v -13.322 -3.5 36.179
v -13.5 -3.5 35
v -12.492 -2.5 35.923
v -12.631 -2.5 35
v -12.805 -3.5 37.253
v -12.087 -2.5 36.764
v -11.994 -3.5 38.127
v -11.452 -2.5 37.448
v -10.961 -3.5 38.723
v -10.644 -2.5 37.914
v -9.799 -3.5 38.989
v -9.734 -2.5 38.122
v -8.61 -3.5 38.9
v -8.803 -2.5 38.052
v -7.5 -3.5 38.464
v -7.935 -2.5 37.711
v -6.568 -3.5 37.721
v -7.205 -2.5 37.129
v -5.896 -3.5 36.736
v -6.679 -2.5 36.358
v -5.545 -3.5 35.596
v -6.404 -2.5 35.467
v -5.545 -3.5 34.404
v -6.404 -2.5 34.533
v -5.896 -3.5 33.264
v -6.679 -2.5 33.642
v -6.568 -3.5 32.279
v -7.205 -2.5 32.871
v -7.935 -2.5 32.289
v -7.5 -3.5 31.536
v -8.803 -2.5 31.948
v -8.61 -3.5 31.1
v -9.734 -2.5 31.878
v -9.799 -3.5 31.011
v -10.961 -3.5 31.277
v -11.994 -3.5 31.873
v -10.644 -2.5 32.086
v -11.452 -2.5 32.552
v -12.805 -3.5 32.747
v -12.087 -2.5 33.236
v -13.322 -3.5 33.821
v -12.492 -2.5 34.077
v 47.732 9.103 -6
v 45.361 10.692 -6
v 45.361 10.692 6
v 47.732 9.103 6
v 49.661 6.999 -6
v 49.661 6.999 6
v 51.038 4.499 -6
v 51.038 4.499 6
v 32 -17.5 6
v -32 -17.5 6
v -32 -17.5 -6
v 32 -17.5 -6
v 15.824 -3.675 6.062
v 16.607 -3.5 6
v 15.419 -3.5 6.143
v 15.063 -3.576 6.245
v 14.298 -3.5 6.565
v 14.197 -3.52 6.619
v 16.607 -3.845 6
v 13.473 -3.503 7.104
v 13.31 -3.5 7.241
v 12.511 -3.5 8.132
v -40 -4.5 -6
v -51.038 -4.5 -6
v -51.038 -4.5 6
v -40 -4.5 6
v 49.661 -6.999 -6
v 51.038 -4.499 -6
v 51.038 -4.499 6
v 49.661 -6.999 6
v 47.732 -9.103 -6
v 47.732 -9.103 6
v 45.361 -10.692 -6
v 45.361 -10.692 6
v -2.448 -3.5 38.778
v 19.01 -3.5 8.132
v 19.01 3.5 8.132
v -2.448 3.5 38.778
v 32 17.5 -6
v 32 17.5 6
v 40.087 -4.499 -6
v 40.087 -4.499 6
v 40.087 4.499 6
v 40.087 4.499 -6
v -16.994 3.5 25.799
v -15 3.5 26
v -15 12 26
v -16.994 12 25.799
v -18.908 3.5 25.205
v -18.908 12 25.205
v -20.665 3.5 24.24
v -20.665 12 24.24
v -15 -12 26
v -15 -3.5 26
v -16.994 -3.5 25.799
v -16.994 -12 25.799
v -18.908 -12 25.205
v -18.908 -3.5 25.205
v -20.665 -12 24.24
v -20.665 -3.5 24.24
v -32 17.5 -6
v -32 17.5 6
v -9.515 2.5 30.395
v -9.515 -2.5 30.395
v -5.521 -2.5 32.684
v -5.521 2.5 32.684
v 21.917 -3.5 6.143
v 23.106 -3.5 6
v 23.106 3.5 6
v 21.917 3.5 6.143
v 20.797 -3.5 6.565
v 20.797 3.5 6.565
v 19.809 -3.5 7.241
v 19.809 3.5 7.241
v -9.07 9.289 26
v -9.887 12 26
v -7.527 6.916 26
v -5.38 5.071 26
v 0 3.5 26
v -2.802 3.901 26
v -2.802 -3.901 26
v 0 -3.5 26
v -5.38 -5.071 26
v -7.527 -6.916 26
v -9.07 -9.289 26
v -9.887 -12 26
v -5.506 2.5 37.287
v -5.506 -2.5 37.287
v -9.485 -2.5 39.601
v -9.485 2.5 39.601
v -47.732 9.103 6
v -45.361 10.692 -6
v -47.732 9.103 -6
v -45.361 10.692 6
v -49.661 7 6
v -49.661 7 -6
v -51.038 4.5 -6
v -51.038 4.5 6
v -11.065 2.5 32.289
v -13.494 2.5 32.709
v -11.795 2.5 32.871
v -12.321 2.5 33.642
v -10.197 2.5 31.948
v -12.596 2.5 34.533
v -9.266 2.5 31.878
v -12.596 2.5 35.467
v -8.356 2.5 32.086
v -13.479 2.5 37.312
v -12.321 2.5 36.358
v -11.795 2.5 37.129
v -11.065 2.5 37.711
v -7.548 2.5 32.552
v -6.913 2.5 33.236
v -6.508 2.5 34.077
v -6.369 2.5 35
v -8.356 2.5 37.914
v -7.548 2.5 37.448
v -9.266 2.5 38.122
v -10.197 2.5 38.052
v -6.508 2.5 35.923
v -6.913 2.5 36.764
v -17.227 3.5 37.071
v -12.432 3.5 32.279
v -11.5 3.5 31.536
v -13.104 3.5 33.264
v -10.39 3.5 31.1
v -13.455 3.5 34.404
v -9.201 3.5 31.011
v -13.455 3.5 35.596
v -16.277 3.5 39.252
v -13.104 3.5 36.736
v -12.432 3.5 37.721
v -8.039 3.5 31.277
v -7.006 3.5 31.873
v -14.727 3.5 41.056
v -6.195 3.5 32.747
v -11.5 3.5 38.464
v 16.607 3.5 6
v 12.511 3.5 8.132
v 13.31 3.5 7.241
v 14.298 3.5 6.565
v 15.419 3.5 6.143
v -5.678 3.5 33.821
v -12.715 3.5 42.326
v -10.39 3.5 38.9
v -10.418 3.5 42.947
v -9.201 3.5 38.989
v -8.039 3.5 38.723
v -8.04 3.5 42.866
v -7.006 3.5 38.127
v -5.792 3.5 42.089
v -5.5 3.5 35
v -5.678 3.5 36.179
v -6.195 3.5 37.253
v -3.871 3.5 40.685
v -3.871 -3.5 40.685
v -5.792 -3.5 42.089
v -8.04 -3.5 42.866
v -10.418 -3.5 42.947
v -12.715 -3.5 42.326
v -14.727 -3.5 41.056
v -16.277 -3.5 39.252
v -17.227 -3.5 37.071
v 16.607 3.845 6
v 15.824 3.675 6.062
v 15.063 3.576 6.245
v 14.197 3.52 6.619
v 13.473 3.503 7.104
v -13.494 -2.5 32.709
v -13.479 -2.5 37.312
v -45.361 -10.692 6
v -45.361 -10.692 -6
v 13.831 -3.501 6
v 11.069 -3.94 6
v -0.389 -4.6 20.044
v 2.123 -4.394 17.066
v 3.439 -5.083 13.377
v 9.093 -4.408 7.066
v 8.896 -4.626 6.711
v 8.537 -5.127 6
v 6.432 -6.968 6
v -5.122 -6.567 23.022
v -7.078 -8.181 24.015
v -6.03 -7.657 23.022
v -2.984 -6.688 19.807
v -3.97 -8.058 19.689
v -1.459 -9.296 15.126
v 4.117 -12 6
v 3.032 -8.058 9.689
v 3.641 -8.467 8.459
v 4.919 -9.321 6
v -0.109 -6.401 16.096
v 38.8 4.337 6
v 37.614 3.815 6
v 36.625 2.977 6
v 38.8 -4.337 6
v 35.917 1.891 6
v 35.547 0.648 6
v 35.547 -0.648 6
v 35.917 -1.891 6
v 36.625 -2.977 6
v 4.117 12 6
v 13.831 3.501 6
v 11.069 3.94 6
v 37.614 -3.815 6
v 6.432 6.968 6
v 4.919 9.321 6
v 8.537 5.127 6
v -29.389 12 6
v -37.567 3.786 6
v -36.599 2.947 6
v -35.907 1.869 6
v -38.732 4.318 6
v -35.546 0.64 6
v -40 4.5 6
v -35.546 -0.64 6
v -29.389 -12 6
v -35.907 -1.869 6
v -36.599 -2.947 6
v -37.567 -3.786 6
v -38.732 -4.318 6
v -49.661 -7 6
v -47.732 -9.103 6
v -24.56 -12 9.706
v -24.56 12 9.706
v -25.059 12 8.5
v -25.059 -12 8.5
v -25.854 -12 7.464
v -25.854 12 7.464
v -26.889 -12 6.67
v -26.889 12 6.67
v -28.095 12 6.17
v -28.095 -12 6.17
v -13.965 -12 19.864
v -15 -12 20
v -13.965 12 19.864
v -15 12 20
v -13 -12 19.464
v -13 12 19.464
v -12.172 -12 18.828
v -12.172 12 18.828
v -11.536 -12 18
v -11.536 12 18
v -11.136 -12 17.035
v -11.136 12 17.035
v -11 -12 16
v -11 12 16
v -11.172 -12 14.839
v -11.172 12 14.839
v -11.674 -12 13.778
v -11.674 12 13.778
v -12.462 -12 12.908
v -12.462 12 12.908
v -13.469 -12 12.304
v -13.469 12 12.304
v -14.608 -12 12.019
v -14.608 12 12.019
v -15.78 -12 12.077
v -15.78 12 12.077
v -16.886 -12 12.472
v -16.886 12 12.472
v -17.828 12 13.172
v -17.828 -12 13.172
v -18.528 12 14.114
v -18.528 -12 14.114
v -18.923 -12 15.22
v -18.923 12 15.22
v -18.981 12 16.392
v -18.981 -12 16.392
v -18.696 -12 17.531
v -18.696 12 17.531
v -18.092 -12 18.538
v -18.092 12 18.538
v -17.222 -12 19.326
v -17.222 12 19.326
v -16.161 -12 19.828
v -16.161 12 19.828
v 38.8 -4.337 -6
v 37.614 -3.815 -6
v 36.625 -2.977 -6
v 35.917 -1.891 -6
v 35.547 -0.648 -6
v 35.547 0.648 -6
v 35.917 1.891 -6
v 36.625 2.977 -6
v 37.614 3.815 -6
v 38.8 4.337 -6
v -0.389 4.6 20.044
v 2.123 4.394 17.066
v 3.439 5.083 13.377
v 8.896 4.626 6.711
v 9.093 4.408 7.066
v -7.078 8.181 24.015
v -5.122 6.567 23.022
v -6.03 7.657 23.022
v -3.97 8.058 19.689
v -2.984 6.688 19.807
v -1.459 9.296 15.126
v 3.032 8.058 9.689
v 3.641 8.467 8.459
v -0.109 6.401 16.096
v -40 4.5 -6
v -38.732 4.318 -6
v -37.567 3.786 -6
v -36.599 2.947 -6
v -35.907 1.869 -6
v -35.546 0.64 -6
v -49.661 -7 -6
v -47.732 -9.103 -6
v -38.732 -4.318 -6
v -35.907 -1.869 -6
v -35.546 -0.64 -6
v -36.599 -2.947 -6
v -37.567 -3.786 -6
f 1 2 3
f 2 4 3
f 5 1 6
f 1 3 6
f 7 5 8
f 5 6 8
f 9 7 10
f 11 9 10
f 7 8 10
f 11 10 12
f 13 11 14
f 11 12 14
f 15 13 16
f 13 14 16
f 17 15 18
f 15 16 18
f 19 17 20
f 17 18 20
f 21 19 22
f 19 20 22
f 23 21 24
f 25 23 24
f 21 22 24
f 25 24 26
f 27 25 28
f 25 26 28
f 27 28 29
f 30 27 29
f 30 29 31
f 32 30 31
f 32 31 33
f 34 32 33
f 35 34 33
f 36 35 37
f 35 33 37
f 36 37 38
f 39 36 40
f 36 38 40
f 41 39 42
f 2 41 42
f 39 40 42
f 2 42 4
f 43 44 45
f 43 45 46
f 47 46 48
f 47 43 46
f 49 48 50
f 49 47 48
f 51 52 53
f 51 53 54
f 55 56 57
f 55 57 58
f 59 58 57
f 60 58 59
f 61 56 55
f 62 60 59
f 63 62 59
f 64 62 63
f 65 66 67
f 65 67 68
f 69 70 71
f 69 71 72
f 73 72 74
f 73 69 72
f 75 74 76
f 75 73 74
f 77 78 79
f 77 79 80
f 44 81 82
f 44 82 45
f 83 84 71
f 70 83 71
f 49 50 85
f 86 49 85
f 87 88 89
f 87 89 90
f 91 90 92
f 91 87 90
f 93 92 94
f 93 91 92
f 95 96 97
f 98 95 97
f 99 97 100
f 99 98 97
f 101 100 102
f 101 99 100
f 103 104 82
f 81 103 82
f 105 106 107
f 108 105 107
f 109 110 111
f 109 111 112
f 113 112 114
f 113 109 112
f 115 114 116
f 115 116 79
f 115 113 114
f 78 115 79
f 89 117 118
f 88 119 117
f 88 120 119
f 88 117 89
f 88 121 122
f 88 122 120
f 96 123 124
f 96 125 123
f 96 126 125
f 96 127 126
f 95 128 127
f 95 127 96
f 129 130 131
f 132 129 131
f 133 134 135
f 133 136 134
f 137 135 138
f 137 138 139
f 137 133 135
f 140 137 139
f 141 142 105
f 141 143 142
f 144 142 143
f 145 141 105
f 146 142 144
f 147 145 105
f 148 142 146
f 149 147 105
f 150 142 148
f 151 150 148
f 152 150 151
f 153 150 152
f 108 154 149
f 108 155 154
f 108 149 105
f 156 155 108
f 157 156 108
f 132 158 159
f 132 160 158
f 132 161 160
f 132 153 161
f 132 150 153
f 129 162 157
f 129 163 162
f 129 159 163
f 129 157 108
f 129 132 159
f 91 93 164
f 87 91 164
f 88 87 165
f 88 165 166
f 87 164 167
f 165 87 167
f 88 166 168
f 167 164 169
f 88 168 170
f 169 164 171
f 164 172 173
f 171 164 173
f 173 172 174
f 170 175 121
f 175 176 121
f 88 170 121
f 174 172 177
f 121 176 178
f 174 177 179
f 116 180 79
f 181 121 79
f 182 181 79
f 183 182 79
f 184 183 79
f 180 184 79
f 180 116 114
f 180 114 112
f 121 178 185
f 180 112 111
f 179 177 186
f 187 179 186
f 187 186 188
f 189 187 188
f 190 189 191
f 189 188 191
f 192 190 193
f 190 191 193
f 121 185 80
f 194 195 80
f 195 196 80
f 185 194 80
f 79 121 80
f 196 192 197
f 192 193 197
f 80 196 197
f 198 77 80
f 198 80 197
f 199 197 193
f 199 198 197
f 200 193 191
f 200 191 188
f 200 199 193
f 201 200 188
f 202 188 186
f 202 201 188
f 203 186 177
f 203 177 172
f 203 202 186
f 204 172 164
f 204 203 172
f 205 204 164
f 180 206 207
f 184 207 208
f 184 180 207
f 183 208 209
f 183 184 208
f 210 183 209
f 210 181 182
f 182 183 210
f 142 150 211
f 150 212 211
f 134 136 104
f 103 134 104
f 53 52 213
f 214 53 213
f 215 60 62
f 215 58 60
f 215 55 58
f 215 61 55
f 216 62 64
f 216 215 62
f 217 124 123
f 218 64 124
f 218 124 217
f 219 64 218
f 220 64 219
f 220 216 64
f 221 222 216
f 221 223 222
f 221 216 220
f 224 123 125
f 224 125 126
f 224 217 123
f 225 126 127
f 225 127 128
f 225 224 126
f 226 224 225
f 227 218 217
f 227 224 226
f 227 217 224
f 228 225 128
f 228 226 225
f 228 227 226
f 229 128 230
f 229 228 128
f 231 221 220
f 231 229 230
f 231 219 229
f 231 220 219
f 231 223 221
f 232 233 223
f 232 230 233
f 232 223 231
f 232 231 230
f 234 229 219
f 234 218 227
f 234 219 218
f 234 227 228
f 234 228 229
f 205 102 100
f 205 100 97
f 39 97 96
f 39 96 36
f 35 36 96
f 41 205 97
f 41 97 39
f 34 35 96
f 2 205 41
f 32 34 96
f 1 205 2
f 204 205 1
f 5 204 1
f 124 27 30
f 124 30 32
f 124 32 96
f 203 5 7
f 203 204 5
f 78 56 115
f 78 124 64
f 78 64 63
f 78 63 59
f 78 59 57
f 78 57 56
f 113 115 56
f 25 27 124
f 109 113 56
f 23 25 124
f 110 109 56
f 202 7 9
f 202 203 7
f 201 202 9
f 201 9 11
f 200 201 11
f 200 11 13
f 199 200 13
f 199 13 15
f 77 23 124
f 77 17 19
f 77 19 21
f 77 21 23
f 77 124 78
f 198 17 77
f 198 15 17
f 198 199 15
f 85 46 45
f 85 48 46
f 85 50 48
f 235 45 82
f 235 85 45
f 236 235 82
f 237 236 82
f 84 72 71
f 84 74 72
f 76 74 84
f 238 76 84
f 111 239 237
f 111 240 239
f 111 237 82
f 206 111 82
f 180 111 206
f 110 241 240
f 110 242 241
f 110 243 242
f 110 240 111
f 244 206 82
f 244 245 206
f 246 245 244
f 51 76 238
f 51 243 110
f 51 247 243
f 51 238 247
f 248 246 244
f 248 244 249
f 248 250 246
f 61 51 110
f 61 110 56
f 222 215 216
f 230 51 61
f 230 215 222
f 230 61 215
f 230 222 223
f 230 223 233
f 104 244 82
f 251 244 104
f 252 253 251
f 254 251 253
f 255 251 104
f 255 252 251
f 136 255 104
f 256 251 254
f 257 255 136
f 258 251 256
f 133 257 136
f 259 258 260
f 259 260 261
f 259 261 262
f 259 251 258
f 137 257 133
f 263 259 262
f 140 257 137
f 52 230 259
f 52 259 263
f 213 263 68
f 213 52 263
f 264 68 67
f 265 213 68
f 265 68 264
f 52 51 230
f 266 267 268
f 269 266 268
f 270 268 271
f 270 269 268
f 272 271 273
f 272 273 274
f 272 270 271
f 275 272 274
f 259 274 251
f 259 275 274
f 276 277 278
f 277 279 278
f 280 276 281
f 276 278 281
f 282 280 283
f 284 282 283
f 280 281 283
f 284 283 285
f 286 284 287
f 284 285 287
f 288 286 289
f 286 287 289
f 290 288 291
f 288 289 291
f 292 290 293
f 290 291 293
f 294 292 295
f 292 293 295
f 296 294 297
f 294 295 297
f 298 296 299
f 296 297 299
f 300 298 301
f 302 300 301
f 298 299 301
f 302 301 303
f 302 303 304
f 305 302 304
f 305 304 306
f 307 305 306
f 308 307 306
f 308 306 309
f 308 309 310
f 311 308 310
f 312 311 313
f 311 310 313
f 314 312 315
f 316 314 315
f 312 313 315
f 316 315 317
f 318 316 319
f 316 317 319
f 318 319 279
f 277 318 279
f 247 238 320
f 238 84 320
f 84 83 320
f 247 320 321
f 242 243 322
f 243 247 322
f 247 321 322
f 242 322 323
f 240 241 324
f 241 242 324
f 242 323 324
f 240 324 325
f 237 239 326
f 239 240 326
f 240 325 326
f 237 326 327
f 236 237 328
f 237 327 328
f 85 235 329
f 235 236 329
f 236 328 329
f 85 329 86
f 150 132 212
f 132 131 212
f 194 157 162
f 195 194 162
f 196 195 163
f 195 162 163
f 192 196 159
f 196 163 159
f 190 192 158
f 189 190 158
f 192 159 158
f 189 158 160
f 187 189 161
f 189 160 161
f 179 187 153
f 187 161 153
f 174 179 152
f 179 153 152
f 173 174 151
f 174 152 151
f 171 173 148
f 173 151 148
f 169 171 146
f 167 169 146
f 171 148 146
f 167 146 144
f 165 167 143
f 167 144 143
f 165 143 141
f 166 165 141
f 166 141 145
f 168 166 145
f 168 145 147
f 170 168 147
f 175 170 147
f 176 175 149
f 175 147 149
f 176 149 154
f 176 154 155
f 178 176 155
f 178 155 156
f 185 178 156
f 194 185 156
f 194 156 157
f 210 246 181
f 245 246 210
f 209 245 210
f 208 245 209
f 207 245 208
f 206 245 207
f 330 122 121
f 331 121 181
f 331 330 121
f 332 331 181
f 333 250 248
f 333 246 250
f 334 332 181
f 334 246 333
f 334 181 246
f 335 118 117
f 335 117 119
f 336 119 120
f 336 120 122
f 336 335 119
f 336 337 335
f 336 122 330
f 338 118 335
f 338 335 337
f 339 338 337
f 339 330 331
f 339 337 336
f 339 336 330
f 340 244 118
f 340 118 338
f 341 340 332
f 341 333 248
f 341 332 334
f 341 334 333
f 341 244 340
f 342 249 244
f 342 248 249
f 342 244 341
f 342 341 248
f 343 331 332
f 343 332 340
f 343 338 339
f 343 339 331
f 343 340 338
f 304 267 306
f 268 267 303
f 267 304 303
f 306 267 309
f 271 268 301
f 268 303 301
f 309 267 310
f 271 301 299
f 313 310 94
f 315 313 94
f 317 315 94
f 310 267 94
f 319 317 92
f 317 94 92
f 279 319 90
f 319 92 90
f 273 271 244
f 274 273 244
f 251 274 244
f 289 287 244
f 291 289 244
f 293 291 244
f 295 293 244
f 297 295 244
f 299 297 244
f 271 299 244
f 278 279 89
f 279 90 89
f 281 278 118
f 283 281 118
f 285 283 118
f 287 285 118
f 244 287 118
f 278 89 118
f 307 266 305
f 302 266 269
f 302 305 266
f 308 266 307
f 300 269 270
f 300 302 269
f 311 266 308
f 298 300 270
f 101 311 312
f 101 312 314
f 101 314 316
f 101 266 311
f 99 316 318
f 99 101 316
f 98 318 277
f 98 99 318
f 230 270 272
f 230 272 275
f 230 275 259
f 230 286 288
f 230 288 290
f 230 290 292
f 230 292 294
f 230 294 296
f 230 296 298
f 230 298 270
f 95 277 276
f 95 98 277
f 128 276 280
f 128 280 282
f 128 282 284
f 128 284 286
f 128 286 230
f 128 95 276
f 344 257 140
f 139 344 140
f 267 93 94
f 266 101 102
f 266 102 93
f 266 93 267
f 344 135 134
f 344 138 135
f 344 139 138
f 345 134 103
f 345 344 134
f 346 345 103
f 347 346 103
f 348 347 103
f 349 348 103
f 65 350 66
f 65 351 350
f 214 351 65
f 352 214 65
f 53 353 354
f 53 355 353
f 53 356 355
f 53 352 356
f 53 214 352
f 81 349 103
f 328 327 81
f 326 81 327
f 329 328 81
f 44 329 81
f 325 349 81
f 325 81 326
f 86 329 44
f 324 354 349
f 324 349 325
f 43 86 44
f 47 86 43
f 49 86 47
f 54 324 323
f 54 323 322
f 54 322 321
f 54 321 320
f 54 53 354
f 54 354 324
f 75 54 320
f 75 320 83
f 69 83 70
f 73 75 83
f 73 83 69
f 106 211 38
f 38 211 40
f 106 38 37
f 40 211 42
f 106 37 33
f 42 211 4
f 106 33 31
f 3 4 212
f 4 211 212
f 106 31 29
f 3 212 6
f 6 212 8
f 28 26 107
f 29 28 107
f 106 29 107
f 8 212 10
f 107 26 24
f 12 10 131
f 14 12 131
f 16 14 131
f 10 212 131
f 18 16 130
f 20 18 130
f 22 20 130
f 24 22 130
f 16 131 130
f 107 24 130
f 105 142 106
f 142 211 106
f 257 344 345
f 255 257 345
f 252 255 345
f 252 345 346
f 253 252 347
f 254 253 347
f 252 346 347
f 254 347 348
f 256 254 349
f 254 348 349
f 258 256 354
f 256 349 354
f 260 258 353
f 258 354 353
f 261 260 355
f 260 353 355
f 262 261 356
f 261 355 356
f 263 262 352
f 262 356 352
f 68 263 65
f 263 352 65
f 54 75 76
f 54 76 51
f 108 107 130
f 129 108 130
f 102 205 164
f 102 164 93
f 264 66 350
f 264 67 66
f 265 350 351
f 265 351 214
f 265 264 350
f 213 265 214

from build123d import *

# Parameters (mm, degrees)
F1_DEPTH        = 17.5
F2_DEPTH        = 12
F3_DEPTH        = 3.5
F4_R            = 10
F7_R            = 10
F11_D           = 9
F13_D           = 9
F20_D           = 5.5
F20_DEPTH       = 3.5
F20_CSINK_D     = 8
F20_CSINK_ANGLE = 82
F20_TIP         = 1.6523667023
F22_D           = 5.5
F22_DEPTH       = 3.5
F22_CSINK_D     = 8
F22_CSINK_ANGLE = 82
F22_TIP         = 1.6523667023
F24_DEPTH       = 2.5


with BuildPart() as f1:
    # F0 (on Front) → F1 (new body, symmetric)
    with BuildSketch(Plane.XZ):
        Polygon((52, -6), (52, 6), (23.1059112473, 6), (16.606986017, 6), (9.0432994782, 6), (7.106986017, 6), (-9.5, 6), (-29.3893709637, 6), (-52, 6), (-52, -6), align=None)
    extrude(amount=F1_DEPTH, both=True)

    # F0 (on Front) → F2 (join, symmetric)
    with BuildSketch(Plane.XZ):
        with BuildLine():
            ThreePointArc((-24.5597418322, 9.7059047745), (-26.3455638186, 7.0332332985), (-29.3893709637, 6))
            Line((-29.3893709637, 6), (-9.5, 6))
            Line((-9.5, 6), (-9.5, 26))
            Line((-9.5, 26), (-15, 26))
            ThreePointArc((-15, 26), (-17.9660849945, 25.5499916129), (-20.665217364, 24.2404679611))
            Line((-20.665217364, 24.2404679611), (-24.5597418322, 9.7059047745))
        make_face()
        with BuildLine():
            ThreePointArc((-11, 16), (-17.8284271247, 13.1715728753), (-15, 20))
            ThreePointArc((-15, 20), (-12.1715728753, 18.8284271247), (-11, 16))
        make_face(mode=Mode.SUBTRACT)
        with BuildLine():
            Line((-9.5, 6), (7.106986017, 6))
            ThreePointArc((7.106986017, 6), (4.7982429508, 6.5649458341), (3.0112257955, 8.1321178182))
            Line((3.0112257955, 8.1321178182), (-9.5, 26))
            Line((-9.5, 26), (-9.5, 6))
        make_face()
        with BuildLine():
            Line((9.0432994782, 6), (16.606986017, 6))
            ThreePointArc((16.606986017, 6), (14.2982429508, 6.5649458341), (12.5112257955, 8.1321178182))
            Line((12.5112257955, 8.1321178182), (0, 26))
            Line((0, 26), (-9.5, 26))
            Line((-9.5, 26), (3.0112257955, 8.1321178182))
            ThreePointArc((3.0112257955, 8.1321178182), (4.7982429508, 6.5649458341), (7.106986017, 6))
            Line((7.106986017, 6), (9.0432994782, 6))
        make_face()
    extrude(amount=F2_DEPTH, both=True)

    # F0 (on Front) → F3 (join, symmetric)
    with BuildSketch(Plane.XZ):
        with BuildLine():
            Line((16.606986017, 6), (23.1059112473, 6))
            ThreePointArc((23.1059112473, 6), (20.7971681811, 6.5649458341), (19.0101510258, 8.1321178182))
            Line((19.0101510258, 8.1321178182), (-2.4481396714, 38.7777329056))
            ThreePointArc((-2.4481396714, 38.7777329056), (-10.4179907667, 42.9471562808), (-17.2274066103, 37.0705523608))
            Line((-17.2274066103, 37.0705523608), (-20.665217364, 24.2404679611))
            ThreePointArc((-20.665217364, 24.2404679611), (-17.9660849945, 25.5499916129), (-15, 26))
            Line((-15, 26), (-9.5, 26))
            Line((-9.5, 26), (0, 26))
            Line((0, 26), (12.5112257955, 8.1321178182))
            ThreePointArc((12.5112257955, 8.1321178182), (14.2982429508, 6.5649458341), (16.606986017, 6))
        make_face()
        with BuildLine():
            ThreePointArc((-6.75, 35), (-7.5554563517, 33.0554563517), (-9.5, 32.25))
            ThreePointArc((-9.5, 32.25), (-11.4445436483, 36.9445436483), (-6.75, 35))
        make_face(mode=Mode.SUBTRACT)
    extrude(amount=F3_DEPTH, both=True)

    # F8: sweep along a path in F5
    with BuildLine(Plane.XZ.offset(12)) as f8_path:
        Line((0, 26), (14.0041507642, 6))
    # F4 (on face) → F8 (sweep, cut)
    with BuildSketch(Plane.XY.offset(26)):
        with Locations((0, -13.5)):
            Circle(F4_R)
    sweep(path=f8_path.line, mode=Mode.SUBTRACT)

    # F9: sweep along a path in F6
    with BuildLine(Plane(origin=(0, 12, 0), x_dir=(-1, 0, 0), z_dir=(0, 1, 0))) as f9_path:
        Line((0, 26), (-14.0041507642, 6))
    # F7 (on face) → F9 (sweep, cut)
    with BuildSketch(Plane.XY.offset(26)):
        with Locations((0, 13.5)):
            Circle(F7_R)
    sweep(path=f9_path.line, mode=Mode.SUBTRACT)

    # F11 (through all)
    with Locations(Plane.XY.offset(6)):
        with Locations((40, 0)):
            Hole(F11_D / 2)

    # F13 (through all)
    with Locations(Plane.XY.offset(6)):
        with Locations((-40, 0)):
            Hole(F13_D / 2)

    # F15: sweep along a path in F15_path
    with BuildLine(Plane(origin=(-52, -17.5, -6), x_dir=(0, 0, -1), z_dir=(0, 1, 0))) as f15_path:
        Line((0, 0), (-12, 0))
    # F14 (on face) → F15 (sweep, cut)
    with BuildSketch(Plane.XY.offset(6)):
        with BuildLine():
            Line((-45.3612986682, 10.6920782903), (-32, 17.5))
            Line((-32, 17.5), (-52, 17.5))
            Line((-52, 17.5), (-52, -17.5))
            Line((-52, -17.5), (-32, -17.5))
            Line((-32, -17.5), (-45.3612986682, -10.6920782903))
            ThreePointArc((-45.3612986682, -10.6920782903), (-51.9134126713, 0), (-45.3612986682, 10.6920782903))
        make_face()
    sweep(path=f15_path.line, mode=Mode.SUBTRACT)

    # F16: sweep along a path in F0
    with BuildLine(Plane.XZ) as f16_path:
        Line((-52, 6), (-52, -6))
    # F12 (on face) → F16 (sweep, cut)
    with BuildSketch(Plane.XY.offset(6)):
        with BuildLine():
            ThreePointArc((-40, -4.5), (-44.5, 0), (-40, 4.5))
            Line((-40, 4.5), (-52, 4.5))
            Line((-52, 4.5), (-52, -4.5))
            Line((-52, -4.5), (-40, -4.5))
        make_face()
    sweep(path=f16_path.line, mode=Mode.SUBTRACT)

    # F17: sweep along a path in F17_path
    with BuildLine(Plane(origin=(52, 17.5, 6), x_dir=(0, 0, 1), z_dir=(0, -1, 0))) as f17_path:
        Line((0, 0), (-12, 0))
    # F12 (on face) → F17 (sweep, cut)
    with BuildSketch(Plane.XY.offset(6)):
        with BuildLine():
            Line((45.3612986682, -10.6920782903), (32, -17.5))
            Line((32, -17.5), (52, -17.5))
            Line((52, -17.5), (52, -4.4991668823))
            Line((52, -4.4991668823), (51.0380473784, -4.4991668823))
            ThreePointArc((51.0380473784, -4.4991668823), (48.7593240742, -8.1086282103), (45.3612986682, -10.6920782903))
        make_face()
    sweep(path=f17_path.line, mode=Mode.SUBTRACT)

    # F18: sweep along a path in F18_path
    with BuildLine(Plane(origin=(52, 17.5, 6), x_dir=(0, 0, 1), z_dir=(0, -1, 0))) as f18_path:
        Line((0, 0), (-12, 0))
    # F12 (on face) → F18 (sweep, cut)
    with BuildSketch(Plane.XY.offset(6)):
        with BuildLine():
            ThreePointArc((51.0380473784, -4.4991668823), (51.9134126713, 0), (51.0380473784, 4.4991668823))
            Line((51.0380473784, 4.4991668823), (40.0865873287, 4.4991668823))
            ThreePointArc((40.0865873287, 4.4991668823), (43.2124478968, 3.1512185755), (44.5, 0))
            ThreePointArc((44.5, 0), (43.2124478968, -3.1512185755), (40.0865873287, -4.4991668823))
            Line((40.0865873287, -4.4991668823), (51.0380473784, -4.4991668823))
        make_face()
        with BuildLine():
            Line((52, 4.4991668823), (51.0380473784, 4.4991668823))
            ThreePointArc((51.0380473784, 4.4991668823), (51.9134126713, 0), (51.0380473784, -4.4991668823))
            Line((51.0380473784, -4.4991668823), (52, -4.4991668823))
            Line((52, -4.4991668823), (52, 4.4991668823))
        make_face()
        with BuildLine():
            Line((52, 17.5), (32, 17.5))
            Line((32, 17.5), (45.3612986682, 10.6920782903))
            ThreePointArc((45.3612986682, 10.6920782903), (48.7593240742, 8.1086282103), (51.0380473784, 4.4991668823))
            Line((51.0380473784, 4.4991668823), (52, 4.4991668823))
            Line((52, 4.4991668823), (52, 17.5))
        make_face()
    sweep(path=f18_path.line, mode=Mode.SUBTRACT)

    # F20
    with Locations(Plane.XZ.offset(3.5)):
        with Locations((-9.5, 35)):
            CounterSinkHole(F20_D / 2, F20_CSINK_D / 2, depth=F20_DEPTH, counter_sink_angle=F20_CSINK_ANGLE)
            with Locations((0, 0, -(F20_DEPTH + F20_TIP / 2))):  # 118° drill point
                Cone(0, F20_D / 2, F20_TIP, mode=Mode.SUBTRACT)

    # F22
    with Locations(Plane(origin=(0, 3.5, 0), x_dir=(-1, 0, 0), z_dir=(0, 1, 0))):
        with Locations((9.5, 35)):
            CounterSinkHole(F22_D / 2, F22_CSINK_D / 2, depth=F22_DEPTH, counter_sink_angle=F22_CSINK_ANGLE)
            with Locations((0, 0, -(F22_DEPTH + F22_TIP / 2))):  # 118° drill point
                Cone(0, F22_D / 2, F22_TIP, mode=Mode.SUBTRACT)

    # F23 (on Front) → F24 (cut, symmetric)
    with BuildSketch(Plane.XZ):
        Polygon((-13.4935649536, 32.709419195), (-9.5146586694, 30.3951730687), (-5.5210095913, 32.6838839269), (-5.5062667973, 37.2868409115), (-9.4851730816, 39.6010870379), (-13.4788221597, 37.3123761796), align=None)
    extrude(amount=F24_DEPTH, both=True, mode=Mode.SUBTRACT)


solid = f1.part
